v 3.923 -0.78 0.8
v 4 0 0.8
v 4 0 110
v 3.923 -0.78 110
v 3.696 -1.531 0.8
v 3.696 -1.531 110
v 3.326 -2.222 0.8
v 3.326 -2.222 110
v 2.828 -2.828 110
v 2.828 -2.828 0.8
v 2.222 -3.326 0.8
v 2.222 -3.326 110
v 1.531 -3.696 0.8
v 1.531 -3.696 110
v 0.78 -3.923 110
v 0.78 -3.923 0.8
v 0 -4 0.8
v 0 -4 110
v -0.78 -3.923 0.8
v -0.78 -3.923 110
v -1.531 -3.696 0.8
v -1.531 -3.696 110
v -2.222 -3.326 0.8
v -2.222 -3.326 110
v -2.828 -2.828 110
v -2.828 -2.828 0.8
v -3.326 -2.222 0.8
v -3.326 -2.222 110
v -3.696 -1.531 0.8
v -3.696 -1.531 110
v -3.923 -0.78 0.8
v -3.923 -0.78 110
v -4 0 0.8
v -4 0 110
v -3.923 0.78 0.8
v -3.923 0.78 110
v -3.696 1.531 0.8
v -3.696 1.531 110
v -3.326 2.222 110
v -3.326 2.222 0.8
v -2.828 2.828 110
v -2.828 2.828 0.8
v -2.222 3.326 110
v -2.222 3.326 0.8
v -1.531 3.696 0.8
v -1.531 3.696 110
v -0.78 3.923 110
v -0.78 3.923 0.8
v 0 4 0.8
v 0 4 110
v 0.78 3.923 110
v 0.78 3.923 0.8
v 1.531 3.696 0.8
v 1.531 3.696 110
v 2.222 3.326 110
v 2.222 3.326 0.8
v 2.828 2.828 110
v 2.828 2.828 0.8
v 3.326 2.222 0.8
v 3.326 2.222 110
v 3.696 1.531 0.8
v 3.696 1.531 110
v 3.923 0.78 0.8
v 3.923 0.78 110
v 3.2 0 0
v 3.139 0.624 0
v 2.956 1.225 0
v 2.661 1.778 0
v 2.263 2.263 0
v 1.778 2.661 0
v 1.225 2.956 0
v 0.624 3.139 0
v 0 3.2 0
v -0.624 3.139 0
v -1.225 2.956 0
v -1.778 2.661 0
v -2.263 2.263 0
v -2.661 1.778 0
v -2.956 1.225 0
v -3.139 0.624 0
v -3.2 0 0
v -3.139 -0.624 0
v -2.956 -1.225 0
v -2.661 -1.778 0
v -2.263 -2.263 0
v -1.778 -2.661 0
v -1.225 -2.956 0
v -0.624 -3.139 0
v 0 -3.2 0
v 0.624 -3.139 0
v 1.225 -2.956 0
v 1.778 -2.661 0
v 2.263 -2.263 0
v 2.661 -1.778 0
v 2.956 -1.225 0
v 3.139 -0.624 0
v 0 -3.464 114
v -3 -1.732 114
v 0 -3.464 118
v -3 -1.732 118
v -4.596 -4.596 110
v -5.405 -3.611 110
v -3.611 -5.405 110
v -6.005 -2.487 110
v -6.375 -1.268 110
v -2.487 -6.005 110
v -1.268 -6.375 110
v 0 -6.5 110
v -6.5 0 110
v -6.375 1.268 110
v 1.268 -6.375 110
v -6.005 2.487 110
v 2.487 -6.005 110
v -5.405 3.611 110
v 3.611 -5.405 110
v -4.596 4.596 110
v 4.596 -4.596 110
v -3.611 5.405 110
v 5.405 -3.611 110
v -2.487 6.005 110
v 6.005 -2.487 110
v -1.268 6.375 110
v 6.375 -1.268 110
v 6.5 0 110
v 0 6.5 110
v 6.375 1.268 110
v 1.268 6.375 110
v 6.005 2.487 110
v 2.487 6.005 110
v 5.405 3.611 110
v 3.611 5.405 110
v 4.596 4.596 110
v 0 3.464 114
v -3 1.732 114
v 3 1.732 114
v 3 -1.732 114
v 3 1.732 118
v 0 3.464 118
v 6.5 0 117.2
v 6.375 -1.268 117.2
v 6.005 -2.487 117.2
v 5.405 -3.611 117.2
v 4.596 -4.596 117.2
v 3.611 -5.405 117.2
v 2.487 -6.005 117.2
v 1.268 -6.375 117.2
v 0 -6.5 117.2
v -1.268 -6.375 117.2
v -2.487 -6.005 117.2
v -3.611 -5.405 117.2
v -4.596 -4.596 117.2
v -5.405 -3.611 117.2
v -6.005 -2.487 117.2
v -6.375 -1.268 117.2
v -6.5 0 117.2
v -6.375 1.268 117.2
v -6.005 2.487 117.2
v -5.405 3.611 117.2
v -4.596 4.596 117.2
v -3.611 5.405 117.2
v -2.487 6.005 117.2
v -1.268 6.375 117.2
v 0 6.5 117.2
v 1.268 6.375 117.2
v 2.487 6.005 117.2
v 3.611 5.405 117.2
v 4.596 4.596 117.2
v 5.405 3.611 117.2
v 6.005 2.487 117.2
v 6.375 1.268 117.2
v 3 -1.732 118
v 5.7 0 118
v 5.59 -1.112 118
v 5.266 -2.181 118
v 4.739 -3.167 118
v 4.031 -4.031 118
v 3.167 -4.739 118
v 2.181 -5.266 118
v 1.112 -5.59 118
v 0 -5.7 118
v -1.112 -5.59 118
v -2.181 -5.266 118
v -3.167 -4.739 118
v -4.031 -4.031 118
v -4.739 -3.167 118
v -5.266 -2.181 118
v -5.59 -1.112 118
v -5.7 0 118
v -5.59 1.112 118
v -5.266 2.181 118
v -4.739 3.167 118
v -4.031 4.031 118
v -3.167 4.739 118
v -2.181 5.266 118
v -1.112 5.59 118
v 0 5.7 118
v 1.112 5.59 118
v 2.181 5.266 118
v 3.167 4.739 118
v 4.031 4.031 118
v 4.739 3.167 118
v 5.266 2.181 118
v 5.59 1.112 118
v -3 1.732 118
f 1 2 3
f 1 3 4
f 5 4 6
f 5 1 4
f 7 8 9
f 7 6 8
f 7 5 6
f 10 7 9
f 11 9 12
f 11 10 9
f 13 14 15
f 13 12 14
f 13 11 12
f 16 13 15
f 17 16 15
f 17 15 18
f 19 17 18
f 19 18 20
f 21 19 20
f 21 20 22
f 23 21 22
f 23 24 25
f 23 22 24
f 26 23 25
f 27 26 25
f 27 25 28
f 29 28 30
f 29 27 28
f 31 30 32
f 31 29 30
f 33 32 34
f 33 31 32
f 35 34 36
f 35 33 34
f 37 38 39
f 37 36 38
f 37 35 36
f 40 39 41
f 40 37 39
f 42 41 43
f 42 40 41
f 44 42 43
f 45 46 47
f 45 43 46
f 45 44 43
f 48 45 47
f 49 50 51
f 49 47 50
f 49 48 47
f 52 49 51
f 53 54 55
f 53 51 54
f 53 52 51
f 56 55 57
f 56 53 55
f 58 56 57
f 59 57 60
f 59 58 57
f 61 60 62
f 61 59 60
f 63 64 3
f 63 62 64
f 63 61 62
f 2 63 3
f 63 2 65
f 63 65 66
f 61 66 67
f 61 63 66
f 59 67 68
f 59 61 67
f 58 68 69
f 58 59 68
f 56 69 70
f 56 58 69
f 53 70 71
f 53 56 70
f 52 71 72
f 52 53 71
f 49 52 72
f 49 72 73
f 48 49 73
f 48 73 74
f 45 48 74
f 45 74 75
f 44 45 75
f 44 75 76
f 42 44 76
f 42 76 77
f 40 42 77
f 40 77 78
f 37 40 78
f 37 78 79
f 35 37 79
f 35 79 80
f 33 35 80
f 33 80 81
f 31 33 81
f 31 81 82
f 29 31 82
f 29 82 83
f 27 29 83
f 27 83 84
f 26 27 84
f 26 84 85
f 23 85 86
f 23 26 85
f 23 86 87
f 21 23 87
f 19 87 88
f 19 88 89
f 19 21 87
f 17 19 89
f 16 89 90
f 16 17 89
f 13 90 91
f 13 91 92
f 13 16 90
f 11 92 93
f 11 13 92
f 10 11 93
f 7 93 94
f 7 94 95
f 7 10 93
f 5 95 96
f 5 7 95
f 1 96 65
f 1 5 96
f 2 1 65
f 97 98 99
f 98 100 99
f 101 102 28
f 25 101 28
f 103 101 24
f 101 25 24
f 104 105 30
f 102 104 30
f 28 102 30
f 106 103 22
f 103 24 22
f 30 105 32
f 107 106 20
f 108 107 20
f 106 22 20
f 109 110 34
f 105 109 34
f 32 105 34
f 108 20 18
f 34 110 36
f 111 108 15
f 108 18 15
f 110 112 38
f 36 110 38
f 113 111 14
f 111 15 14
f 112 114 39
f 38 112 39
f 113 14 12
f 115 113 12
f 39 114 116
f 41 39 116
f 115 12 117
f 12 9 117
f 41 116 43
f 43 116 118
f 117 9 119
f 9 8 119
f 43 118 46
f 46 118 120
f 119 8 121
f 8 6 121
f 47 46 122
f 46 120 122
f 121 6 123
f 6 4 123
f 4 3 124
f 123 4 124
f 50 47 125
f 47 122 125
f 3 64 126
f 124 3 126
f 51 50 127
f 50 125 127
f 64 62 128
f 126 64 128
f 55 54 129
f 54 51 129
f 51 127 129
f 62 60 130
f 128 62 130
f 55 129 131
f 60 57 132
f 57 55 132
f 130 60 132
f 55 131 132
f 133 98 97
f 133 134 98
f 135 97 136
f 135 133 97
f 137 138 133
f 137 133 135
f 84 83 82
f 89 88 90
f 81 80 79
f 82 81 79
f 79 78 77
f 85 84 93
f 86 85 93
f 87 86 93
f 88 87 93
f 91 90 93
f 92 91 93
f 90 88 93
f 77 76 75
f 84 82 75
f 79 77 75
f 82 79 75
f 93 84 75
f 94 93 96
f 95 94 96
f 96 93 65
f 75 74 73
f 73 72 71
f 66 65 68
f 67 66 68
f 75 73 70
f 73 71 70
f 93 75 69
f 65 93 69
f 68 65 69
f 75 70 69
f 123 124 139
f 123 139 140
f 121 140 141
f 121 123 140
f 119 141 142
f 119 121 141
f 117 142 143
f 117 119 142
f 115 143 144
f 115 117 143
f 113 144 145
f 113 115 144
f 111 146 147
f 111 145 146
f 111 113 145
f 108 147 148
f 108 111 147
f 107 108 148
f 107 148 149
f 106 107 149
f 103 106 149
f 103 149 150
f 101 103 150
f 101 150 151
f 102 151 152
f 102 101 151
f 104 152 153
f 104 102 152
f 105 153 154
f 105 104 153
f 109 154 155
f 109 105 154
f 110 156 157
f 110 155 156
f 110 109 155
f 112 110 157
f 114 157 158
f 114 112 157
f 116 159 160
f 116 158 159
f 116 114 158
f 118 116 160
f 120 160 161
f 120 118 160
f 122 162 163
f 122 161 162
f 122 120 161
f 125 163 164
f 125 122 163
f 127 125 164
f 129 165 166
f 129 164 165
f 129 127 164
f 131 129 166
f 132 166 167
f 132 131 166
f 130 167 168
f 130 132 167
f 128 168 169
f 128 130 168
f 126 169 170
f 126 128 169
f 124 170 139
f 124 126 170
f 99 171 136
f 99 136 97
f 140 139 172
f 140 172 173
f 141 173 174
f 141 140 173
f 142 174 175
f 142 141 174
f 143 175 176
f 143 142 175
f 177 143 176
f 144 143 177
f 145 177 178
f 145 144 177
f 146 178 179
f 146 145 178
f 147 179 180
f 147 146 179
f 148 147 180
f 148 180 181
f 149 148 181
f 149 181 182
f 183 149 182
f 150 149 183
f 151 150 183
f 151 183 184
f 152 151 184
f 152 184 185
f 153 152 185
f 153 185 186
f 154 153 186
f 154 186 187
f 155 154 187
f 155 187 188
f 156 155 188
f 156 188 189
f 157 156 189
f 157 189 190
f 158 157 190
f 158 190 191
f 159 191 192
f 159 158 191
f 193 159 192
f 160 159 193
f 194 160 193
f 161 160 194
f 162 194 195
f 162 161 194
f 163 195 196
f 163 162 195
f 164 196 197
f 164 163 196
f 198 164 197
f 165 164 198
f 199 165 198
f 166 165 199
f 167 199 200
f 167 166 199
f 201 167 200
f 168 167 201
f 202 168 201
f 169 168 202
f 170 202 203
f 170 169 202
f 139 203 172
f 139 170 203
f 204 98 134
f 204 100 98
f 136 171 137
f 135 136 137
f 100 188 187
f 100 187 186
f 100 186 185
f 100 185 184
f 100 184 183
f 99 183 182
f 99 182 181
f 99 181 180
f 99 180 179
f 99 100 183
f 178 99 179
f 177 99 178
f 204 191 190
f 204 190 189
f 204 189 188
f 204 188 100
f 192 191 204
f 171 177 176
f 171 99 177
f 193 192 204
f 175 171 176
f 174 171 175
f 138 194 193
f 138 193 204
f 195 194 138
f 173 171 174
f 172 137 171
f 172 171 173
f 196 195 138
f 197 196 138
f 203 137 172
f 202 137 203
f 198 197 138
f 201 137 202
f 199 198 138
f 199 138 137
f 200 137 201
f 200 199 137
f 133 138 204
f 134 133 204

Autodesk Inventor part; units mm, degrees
ref_plane "YZ Plane" through (0, 0, 0) normal (1, 0, 0) x (0, 1, 0)
ref_plane "XZ Plane" through (0, 0, 0) normal (0, 1, 0) x (-1, 0, 0)
ref_plane "XY Plane" through (0, 0, 0) normal (0, 0, 1) x (1, 0, 0)
sketch "Sketch1" plane through (0, 0, 0) normal (0, 0, 1) x (1, 0, 0)
  circle A0 centre (0, 0) radius 4
  dimension "Diameter" = 8
extrude "Extrusion1" add sketch "Sketch1" along normal blind 110
sketch "Sketch2" plane through (0, 0, 110) normal (0, 0, 1) x (1, 0, 0)
  circle A0 centre (0, 0) radius 4 projected
  circle A1 centre (0, 0) radius 6.5
  dimension "Head_Diameter" = 13
extrude "Extrusion2" add sketch "Sketch2" along normal blind 8 contours A0 | A1
sketch "Sketch3" plane through (0, 0, 118) normal (0, 0, 1) x (1, 0, 0)
  circle A0 centre (0, 0) radius 6.5 projected
  circle A1 centre (0, 0) radius 3.4641 construction
  line L0 (0, 3.4641) -> (3, 1.7321)
  line L1 (3, -1.7321) -> (3, 1.7321)
  line L2 (0, 3.4641) -> (-3, 1.7321)
  line L3 (-3, -1.7321) -> (-3, 1.7321)
  line L4 (-3, -1.7321) -> (0, -3.4641)
  line L5 (3, -1.7321) -> (0, -3.4641)
  dimension "Hex_Width" = 6
extrude "Extrusion3" cut sketch "Sketch3" against normal blind 4 contours L0 L1 L5 L4 L3 L2
thread "Thread1" size "M8x1.25" class "4g6g" standard "ANSI Metric M Profile" length 28
chamfer "Chamfer1" distance 0.8 angle 45 2 edges at (-6.5, 0, 118) (-4, 0, 0)
equation "\"d9\" = ThreadLength"
equation "\"d12\" = Chamfer"
equation "\"ThreadLength\" = 28"
equation "\"Chamfer\" = 0.8"
properties part number "SCREW, SOCKET HD, P, 12.9, M8X1.25X110MM"
